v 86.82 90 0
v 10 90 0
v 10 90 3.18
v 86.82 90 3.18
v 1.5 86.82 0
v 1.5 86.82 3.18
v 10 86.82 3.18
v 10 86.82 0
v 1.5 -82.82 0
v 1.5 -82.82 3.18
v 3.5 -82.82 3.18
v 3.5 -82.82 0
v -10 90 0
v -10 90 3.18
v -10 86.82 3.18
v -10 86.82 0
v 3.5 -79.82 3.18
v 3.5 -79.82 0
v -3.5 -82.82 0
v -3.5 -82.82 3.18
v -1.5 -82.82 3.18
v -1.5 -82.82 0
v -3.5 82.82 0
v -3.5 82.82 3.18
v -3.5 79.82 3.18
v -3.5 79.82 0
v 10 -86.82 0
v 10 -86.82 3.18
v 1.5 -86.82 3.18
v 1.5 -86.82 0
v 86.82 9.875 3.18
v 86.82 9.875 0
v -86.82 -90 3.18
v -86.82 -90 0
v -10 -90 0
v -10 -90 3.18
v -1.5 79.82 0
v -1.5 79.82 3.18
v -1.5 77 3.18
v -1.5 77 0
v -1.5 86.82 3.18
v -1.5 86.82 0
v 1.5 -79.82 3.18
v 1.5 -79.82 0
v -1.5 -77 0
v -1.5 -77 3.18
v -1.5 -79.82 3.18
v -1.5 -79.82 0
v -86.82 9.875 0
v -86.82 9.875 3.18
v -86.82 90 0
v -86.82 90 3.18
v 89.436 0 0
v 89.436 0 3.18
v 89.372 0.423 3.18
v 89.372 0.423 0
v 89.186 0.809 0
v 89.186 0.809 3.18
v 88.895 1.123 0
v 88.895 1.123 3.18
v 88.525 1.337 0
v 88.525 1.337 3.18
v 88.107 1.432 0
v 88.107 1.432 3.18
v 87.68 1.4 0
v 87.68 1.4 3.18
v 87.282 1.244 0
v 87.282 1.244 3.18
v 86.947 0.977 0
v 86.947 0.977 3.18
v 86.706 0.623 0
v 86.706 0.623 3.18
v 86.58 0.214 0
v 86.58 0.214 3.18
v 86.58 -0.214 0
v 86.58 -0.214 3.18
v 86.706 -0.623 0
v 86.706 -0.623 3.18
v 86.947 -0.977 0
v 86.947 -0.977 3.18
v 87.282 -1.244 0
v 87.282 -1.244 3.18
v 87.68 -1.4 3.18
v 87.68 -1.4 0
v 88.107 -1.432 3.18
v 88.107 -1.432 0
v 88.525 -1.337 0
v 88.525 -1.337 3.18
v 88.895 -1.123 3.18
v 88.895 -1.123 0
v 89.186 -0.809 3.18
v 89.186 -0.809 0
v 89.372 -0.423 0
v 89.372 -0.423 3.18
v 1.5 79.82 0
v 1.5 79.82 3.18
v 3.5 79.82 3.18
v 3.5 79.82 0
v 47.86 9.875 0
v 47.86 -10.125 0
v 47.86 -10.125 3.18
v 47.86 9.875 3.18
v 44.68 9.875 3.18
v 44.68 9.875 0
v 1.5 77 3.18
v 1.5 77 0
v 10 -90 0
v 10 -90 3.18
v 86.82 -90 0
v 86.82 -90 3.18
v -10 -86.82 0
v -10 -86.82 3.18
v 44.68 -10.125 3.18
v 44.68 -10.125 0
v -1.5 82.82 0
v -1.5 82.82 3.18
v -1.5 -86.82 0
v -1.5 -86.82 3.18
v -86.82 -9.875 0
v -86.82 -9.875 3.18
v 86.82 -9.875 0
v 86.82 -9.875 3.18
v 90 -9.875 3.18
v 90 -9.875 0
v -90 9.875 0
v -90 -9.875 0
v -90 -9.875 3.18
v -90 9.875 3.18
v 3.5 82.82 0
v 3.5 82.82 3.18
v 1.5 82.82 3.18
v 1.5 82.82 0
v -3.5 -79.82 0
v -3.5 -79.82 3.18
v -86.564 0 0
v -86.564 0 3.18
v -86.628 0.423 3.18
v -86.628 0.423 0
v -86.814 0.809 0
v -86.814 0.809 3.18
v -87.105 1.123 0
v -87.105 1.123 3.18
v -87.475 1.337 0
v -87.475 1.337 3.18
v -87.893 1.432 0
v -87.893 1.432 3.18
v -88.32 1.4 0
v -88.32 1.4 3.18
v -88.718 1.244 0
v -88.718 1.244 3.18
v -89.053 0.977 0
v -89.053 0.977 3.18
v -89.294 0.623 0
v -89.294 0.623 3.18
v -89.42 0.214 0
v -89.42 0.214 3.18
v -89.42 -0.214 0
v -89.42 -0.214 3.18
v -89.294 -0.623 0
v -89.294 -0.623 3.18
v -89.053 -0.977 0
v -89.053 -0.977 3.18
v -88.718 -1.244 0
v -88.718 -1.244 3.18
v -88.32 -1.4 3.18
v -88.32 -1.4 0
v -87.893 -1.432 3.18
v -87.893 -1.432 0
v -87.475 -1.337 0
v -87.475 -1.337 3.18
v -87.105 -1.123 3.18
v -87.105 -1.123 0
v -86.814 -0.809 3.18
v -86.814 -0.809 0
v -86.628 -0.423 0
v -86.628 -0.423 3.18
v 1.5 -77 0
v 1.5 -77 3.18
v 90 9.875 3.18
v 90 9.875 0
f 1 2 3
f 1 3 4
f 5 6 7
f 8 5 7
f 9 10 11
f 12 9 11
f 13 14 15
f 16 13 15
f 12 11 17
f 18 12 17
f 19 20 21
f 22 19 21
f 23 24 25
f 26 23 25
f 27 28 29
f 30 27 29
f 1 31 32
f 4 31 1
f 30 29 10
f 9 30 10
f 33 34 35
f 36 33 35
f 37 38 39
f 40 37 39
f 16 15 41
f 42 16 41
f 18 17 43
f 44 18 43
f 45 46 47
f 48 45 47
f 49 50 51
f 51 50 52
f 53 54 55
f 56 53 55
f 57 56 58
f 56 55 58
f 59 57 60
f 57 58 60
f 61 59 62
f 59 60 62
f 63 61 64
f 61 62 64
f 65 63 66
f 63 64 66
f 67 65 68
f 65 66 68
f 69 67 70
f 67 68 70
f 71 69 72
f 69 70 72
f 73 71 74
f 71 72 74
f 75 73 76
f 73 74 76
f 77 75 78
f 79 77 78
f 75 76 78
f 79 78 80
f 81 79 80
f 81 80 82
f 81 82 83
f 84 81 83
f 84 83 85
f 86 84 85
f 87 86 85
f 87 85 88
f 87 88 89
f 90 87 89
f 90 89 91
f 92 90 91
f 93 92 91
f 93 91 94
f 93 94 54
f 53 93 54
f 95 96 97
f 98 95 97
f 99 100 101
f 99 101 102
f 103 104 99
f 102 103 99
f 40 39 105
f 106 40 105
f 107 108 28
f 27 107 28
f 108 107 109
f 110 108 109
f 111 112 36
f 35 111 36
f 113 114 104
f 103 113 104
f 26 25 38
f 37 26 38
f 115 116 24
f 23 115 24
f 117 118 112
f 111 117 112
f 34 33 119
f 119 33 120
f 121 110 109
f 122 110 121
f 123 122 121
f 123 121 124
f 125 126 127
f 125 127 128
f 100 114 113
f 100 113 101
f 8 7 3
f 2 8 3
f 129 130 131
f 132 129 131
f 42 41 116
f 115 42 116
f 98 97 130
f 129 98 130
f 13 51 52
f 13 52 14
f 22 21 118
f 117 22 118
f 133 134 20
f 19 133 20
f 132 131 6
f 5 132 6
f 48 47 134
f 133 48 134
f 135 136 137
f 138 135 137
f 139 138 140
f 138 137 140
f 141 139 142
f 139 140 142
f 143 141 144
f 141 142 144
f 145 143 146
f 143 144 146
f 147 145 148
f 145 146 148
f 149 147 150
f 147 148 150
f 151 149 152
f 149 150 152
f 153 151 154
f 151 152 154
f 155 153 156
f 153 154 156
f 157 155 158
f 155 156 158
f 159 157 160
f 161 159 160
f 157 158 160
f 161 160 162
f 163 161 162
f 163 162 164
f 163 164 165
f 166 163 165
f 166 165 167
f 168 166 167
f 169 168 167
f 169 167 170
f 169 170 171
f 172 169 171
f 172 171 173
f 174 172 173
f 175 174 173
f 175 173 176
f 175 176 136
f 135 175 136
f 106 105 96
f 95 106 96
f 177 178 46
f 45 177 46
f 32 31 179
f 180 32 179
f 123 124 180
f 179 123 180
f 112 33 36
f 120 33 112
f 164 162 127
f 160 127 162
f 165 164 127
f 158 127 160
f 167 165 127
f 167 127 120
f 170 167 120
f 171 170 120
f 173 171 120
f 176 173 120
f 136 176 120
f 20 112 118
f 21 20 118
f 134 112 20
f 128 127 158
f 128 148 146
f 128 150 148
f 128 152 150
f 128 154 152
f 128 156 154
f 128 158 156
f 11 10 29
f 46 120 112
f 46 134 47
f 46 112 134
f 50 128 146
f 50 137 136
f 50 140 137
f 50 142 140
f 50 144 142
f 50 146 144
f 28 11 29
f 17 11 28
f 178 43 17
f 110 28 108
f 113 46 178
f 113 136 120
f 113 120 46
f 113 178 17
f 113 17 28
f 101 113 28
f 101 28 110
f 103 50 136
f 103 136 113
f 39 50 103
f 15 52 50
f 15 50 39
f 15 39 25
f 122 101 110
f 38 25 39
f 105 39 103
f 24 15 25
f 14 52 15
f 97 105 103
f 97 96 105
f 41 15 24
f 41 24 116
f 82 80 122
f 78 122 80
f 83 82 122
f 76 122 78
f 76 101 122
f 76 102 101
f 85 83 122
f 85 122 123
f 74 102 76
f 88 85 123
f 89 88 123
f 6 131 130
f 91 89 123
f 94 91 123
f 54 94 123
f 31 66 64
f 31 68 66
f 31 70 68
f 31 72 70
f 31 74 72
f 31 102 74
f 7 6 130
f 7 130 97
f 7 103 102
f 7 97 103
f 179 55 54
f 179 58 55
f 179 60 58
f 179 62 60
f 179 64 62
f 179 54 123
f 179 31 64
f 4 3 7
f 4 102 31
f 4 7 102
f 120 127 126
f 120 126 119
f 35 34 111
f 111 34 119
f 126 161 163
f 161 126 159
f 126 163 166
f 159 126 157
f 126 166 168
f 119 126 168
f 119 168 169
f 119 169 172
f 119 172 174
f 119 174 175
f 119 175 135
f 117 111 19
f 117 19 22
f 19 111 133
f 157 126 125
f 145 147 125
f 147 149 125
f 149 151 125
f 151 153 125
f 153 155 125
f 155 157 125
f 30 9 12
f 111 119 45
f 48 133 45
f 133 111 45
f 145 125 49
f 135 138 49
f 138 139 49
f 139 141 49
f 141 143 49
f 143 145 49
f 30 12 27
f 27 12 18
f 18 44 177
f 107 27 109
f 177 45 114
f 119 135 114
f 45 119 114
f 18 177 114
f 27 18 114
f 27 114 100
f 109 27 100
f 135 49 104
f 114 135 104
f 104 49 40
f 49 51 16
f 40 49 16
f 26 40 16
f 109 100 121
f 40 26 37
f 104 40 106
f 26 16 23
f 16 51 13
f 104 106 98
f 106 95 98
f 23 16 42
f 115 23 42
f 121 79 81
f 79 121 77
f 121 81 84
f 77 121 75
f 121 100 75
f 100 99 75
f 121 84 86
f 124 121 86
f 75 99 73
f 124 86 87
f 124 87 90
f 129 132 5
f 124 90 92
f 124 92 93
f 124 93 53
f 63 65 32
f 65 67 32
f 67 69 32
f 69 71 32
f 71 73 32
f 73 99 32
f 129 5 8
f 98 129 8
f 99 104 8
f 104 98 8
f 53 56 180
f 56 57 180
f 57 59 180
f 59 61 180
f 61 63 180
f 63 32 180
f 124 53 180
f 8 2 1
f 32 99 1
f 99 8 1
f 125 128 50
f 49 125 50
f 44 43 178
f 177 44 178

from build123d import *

# Parameters (mm, degrees)
SKETCH3_W           = 180
SKETCH3_H           = 180
SKETCH3_W_2         = 3.18
SKETCH3_H_2         = 20
BOSS_EXTRUDE1_DEPTH = 3.18
CUT_EXTRUDE1_DEPTH  = 128.318939675
SKETCH5_R           = 1.436023081
SKETCH5_W           = 3.18
SKETCH5_H           = 80.125
CUT_EXTRUDE2_DEPTH  = 128.318939675


with BuildPart() as part:
    # Sketch3 → Boss-Extrude1 (new body)
    with BuildSketch(Plane.XY):
        Rectangle(SKETCH3_W, SKETCH3_H)
        with Locations((46.269729843, -0.125)):
            Rectangle(SKETCH3_W_2, SKETCH3_H_2, mode=Mode.SUBTRACT)
    extrude(amount=BOSS_EXTRUDE1_DEPTH)

    # Sketch4 → Cut-Extrude1 (cut, through all)
    with BuildSketch(Plane.XY.offset(3.18)):
        Polygon((1.5, 86.82), (10, 86.82), (10, 90), (-10, 90), (-10, 86.82), (-1.5, 86.82), (-1.5, 82.82), (-3.5, 82.82), (-3.5, 79.82), (-1.5, 79.82), (-1.5, 77), (1.5, 77), (1.5, 79.82), (3.5, 79.82), (3.5, 82.82), (1.5, 82.82), align=None)
        Polygon((1.5, -79.82), (1.5, -77), (-1.5, -77), (-1.5, -79.82), (-3.5, -79.82), (-3.5, -82.82), (-1.5, -82.82), (-1.5, -86.82), (-10, -86.82), (-10, -90), (10, -90), (10, -86.82), (1.5, -86.82), (1.5, -82.82), (3.5, -82.82), (3.5, -79.82), align=None)
    extrude(amount=-CUT_EXTRUDE1_DEPTH, mode=Mode.SUBTRACT)

    # Sketch5 → Cut-Extrude2 (cut, through all)
    with BuildSketch(Plane.XY.offset(3.18)):
        with Locations((-88, 0)):
            Circle(SKETCH5_R)
        with Locations((88, 0)):
            Circle(SKETCH5_R)
        with Locations((-88.41, 49.9375)):
            Rectangle(SKETCH5_W, SKETCH5_H)
        with Locations((-88.41, -49.9375)):
            Rectangle(SKETCH5_W, SKETCH5_H)
        with Locations((88.41, -49.9375)):
            Rectangle(SKETCH5_W, SKETCH5_H)
        with Locations((88.41, 49.9375)):
            Rectangle(SKETCH5_W, SKETCH5_H)
    extrude(amount=-CUT_EXTRUDE2_DEPTH, mode=Mode.SUBTRACT)


solid = part.part
